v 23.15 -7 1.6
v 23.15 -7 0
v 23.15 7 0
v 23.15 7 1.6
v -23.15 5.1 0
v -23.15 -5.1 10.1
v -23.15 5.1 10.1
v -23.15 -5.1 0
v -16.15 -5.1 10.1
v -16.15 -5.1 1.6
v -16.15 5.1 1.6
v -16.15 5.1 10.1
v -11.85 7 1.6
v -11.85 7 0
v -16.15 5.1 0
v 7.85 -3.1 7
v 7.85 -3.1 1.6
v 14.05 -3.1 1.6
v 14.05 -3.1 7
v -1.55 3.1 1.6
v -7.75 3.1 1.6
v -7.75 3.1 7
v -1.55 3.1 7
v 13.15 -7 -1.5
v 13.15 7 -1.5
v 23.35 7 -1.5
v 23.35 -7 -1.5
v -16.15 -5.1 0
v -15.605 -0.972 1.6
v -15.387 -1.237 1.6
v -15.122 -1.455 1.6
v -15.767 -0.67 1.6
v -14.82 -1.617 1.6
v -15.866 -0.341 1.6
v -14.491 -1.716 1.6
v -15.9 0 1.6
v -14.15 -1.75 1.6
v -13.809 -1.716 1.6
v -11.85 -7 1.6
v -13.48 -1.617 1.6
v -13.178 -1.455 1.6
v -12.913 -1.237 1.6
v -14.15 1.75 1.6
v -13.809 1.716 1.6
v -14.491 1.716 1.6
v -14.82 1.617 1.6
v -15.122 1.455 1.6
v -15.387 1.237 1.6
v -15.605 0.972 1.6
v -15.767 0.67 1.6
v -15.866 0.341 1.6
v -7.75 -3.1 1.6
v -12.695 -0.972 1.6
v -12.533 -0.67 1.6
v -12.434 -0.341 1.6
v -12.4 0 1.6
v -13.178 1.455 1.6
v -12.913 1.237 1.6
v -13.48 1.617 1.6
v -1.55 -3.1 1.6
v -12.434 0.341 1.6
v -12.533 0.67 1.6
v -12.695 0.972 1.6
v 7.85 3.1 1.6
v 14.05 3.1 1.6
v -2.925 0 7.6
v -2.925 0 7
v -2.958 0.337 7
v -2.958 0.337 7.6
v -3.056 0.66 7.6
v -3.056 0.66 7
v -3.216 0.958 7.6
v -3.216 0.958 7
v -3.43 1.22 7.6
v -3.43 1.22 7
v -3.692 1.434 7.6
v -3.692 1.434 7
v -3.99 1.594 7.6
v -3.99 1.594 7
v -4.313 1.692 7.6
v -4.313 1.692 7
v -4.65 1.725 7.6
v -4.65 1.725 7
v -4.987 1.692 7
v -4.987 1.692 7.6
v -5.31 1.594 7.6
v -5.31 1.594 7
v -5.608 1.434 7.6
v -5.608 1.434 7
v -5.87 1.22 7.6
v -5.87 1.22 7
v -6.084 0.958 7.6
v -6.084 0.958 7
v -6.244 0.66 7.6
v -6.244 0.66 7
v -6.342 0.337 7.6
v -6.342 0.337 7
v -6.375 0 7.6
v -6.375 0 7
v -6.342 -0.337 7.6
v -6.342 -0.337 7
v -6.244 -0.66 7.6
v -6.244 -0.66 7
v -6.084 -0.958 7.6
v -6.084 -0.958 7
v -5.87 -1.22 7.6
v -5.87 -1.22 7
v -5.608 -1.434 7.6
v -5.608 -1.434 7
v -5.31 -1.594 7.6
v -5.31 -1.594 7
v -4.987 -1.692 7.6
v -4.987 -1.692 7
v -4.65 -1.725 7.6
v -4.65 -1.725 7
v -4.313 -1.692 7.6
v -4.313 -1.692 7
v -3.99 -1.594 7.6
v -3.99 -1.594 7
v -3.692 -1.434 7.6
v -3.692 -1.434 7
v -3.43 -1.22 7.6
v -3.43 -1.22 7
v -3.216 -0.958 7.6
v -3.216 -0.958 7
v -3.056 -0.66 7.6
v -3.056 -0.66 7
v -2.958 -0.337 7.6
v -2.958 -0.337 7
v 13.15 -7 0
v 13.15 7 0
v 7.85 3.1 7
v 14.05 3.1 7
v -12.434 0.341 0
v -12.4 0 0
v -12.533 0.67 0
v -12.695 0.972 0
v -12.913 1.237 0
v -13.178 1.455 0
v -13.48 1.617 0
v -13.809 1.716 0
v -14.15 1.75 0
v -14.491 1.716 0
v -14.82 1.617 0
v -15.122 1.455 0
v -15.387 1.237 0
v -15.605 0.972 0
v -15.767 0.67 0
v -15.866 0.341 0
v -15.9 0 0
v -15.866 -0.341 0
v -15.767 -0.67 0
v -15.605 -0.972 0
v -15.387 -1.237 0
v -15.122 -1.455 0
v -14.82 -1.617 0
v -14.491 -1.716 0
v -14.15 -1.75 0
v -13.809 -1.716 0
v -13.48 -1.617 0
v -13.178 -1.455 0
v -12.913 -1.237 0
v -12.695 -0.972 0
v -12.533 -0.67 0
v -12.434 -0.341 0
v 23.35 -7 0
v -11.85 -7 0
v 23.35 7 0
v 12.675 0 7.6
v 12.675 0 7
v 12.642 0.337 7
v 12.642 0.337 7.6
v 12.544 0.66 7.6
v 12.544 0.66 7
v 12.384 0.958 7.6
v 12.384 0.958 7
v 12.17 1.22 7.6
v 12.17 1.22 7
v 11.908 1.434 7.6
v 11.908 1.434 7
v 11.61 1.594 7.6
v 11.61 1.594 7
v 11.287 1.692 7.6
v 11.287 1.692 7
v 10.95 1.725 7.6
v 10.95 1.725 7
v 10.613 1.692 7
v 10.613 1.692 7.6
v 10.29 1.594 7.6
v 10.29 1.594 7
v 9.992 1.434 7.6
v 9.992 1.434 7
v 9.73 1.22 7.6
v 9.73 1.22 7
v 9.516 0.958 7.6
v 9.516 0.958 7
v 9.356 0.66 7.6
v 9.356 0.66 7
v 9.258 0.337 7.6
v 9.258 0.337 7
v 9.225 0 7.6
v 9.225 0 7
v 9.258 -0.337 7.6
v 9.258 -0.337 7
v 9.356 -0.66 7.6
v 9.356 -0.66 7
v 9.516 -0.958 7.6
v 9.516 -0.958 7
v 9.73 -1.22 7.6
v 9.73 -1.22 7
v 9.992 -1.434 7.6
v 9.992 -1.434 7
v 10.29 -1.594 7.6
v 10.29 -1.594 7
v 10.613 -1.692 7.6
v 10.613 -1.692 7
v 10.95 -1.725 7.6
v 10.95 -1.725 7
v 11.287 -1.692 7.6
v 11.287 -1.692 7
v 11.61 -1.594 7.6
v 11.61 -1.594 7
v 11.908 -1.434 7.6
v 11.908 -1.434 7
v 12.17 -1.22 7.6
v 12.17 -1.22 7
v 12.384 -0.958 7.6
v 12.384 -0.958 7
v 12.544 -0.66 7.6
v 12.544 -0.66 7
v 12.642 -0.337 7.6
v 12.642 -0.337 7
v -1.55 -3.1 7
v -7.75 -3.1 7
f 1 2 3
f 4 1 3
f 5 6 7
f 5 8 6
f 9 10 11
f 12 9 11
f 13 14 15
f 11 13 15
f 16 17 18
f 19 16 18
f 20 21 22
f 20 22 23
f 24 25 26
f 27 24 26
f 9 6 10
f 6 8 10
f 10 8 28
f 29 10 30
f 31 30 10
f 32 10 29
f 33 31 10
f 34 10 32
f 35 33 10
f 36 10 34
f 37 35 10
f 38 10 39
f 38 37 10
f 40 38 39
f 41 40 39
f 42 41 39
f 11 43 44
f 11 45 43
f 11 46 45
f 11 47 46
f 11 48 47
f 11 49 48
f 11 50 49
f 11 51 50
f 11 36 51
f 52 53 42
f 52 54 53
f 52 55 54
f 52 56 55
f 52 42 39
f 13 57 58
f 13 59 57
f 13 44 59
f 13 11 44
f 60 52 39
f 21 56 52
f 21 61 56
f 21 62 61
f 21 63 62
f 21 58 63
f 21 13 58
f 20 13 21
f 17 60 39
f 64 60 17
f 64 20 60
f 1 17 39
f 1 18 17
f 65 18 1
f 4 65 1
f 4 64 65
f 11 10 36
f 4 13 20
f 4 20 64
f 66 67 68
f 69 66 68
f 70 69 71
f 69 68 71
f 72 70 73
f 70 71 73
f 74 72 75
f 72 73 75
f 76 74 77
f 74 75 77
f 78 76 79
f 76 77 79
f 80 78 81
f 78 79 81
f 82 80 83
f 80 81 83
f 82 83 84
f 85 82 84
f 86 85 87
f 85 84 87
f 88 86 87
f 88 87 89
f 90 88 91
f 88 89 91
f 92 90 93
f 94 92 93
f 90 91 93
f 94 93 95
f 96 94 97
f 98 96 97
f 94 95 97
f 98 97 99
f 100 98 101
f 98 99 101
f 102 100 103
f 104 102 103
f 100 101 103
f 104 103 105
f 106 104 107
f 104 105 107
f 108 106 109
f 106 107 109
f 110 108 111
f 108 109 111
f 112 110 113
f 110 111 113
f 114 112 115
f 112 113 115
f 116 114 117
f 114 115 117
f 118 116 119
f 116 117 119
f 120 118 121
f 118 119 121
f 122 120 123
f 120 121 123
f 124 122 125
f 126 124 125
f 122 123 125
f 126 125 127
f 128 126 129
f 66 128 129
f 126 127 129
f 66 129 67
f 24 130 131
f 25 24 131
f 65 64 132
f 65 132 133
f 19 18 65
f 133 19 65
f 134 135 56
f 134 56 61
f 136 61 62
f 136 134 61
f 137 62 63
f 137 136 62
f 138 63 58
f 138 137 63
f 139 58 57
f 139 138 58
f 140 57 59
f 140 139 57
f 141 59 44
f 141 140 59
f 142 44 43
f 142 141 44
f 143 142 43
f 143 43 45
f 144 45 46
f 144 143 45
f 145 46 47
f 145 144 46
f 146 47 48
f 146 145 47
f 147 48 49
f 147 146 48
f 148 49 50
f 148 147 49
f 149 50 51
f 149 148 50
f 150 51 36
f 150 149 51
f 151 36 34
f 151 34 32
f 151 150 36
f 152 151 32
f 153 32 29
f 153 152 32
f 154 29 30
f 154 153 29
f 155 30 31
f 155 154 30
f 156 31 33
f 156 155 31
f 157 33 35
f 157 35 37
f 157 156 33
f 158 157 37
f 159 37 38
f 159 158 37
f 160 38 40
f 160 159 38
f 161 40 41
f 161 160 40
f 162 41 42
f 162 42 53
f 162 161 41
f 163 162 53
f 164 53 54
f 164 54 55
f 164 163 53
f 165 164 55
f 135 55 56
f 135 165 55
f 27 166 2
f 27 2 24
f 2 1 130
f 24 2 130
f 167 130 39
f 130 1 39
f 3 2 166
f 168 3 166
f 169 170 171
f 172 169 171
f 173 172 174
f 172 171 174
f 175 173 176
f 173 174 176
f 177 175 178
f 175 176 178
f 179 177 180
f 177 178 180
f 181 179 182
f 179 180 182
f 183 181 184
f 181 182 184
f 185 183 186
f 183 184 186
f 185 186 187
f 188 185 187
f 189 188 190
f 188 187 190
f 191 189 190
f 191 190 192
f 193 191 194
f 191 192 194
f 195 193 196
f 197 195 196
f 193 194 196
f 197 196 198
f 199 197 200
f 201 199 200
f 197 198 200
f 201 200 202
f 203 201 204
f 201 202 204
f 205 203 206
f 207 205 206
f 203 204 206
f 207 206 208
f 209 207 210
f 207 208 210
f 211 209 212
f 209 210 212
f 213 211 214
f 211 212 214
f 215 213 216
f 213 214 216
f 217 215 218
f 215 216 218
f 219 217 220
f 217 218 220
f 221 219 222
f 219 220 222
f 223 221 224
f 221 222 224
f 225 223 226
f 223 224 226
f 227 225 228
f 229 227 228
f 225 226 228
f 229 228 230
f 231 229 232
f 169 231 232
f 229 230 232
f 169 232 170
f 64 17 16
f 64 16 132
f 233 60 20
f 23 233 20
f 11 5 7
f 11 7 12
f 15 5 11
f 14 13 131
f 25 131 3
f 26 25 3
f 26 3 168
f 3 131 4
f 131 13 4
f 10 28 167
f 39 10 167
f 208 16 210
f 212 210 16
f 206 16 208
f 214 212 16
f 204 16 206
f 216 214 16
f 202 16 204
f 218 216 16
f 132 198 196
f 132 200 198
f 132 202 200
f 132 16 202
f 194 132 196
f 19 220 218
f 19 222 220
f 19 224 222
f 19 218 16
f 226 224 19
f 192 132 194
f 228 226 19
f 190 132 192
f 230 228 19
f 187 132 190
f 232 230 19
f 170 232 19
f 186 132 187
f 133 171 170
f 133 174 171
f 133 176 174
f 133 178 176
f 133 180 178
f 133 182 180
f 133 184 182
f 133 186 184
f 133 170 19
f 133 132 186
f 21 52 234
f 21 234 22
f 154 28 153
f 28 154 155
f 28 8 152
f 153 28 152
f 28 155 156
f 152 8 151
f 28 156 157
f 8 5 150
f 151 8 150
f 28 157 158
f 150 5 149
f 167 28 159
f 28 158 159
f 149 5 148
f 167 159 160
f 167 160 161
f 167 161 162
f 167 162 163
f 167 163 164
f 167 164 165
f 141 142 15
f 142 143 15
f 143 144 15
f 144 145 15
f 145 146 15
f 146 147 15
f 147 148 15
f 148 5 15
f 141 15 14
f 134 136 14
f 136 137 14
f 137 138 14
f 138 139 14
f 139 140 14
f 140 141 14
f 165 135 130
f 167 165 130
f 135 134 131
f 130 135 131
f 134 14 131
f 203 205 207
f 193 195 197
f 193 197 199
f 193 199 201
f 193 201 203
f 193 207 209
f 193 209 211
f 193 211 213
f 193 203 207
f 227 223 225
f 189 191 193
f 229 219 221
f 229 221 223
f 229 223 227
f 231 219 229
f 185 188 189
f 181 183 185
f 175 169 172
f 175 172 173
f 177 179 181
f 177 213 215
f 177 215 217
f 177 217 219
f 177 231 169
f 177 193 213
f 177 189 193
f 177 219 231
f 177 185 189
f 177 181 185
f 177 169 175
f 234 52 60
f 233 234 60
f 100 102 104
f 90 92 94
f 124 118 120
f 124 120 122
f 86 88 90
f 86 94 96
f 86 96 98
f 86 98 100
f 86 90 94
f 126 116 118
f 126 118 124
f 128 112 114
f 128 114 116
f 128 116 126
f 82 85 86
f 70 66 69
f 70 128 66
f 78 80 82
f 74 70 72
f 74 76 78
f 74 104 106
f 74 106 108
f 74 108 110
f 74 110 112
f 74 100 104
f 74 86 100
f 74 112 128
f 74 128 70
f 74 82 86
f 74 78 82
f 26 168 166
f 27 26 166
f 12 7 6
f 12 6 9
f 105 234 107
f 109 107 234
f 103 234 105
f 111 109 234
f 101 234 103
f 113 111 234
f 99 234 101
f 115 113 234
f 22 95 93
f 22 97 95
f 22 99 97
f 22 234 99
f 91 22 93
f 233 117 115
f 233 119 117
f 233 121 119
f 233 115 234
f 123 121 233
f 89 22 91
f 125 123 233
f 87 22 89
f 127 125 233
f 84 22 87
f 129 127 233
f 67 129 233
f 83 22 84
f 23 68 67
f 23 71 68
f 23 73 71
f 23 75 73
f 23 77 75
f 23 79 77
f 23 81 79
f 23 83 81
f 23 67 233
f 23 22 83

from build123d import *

# Parameters (mm, degrees)
F0_R      = 1.75
F1_DEPTH  = 1.6
F2_W      = 7
F2_H      = 10.2
F3_DEPTH  = 8.5
F4_W      = 6.2
F4_H      = 6.2
F5_DEPTH  = 5.4
F6_R      = 1.725
F7_R      = 1.725
F8_DEPTH  = 0.6
F10_DEPTH = 1.5


with BuildPart() as f1:
    # F0 (on Top) → F1 (new body)
    with BuildSketch(Plane.XY):
        Polygon((-16.15, 5.1), (-23.15, 5.1), (-23.15, -5.1), (-16.15, -5.1), (-11.85, -7), (23.15, -7), (23.15, 7), (-11.85, 7), align=None)
        with Locations((-14.15, 0)):
            Circle(F0_R, mode=Mode.SUBTRACT)
    extrude(amount=F1_DEPTH)

    # F2 (on face) → F3 (join)
    with BuildSketch(Plane.XY.offset(1.6)):
        with Locations((-19.65, 0)):
            Rectangle(F2_W, F2_H)
    extrude(amount=F3_DEPTH)

    # F4 (on face) → F5 (join)
    with BuildSketch(Plane.XY.offset(1.6)):
        with Locations((-4.65, 0)):
            Rectangle(F4_W, F4_H)
        with Locations((10.95, 0)):
            Rectangle(F4_W, F4_H)
    extrude(amount=F5_DEPTH)

    # F6 (on face) + F7 (on face) → F8 (join)
    with BuildSketch(Plane.XY.offset(7)):
        with Locations((-4.65, 0)):
            Circle(F6_R)
    with BuildSketch(Plane.XY.offset(7)):
        with Locations((10.95, 0)):
            Circle(F7_R)
    extrude(amount=F8_DEPTH)

    # F9 (on face) → F10 (join)
    with BuildSketch(Plane(origin=(0, 0, 0), x_dir=(1, 0, 0), z_dir=(0, 0, -1))):
        Polygon((23.35, 7), (23.15, 7), (13.15, 7), (13.15, -7), (23.15, -7), (23.35, -7), align=None)
    extrude(amount=F10_DEPTH)


solid = f1.part
